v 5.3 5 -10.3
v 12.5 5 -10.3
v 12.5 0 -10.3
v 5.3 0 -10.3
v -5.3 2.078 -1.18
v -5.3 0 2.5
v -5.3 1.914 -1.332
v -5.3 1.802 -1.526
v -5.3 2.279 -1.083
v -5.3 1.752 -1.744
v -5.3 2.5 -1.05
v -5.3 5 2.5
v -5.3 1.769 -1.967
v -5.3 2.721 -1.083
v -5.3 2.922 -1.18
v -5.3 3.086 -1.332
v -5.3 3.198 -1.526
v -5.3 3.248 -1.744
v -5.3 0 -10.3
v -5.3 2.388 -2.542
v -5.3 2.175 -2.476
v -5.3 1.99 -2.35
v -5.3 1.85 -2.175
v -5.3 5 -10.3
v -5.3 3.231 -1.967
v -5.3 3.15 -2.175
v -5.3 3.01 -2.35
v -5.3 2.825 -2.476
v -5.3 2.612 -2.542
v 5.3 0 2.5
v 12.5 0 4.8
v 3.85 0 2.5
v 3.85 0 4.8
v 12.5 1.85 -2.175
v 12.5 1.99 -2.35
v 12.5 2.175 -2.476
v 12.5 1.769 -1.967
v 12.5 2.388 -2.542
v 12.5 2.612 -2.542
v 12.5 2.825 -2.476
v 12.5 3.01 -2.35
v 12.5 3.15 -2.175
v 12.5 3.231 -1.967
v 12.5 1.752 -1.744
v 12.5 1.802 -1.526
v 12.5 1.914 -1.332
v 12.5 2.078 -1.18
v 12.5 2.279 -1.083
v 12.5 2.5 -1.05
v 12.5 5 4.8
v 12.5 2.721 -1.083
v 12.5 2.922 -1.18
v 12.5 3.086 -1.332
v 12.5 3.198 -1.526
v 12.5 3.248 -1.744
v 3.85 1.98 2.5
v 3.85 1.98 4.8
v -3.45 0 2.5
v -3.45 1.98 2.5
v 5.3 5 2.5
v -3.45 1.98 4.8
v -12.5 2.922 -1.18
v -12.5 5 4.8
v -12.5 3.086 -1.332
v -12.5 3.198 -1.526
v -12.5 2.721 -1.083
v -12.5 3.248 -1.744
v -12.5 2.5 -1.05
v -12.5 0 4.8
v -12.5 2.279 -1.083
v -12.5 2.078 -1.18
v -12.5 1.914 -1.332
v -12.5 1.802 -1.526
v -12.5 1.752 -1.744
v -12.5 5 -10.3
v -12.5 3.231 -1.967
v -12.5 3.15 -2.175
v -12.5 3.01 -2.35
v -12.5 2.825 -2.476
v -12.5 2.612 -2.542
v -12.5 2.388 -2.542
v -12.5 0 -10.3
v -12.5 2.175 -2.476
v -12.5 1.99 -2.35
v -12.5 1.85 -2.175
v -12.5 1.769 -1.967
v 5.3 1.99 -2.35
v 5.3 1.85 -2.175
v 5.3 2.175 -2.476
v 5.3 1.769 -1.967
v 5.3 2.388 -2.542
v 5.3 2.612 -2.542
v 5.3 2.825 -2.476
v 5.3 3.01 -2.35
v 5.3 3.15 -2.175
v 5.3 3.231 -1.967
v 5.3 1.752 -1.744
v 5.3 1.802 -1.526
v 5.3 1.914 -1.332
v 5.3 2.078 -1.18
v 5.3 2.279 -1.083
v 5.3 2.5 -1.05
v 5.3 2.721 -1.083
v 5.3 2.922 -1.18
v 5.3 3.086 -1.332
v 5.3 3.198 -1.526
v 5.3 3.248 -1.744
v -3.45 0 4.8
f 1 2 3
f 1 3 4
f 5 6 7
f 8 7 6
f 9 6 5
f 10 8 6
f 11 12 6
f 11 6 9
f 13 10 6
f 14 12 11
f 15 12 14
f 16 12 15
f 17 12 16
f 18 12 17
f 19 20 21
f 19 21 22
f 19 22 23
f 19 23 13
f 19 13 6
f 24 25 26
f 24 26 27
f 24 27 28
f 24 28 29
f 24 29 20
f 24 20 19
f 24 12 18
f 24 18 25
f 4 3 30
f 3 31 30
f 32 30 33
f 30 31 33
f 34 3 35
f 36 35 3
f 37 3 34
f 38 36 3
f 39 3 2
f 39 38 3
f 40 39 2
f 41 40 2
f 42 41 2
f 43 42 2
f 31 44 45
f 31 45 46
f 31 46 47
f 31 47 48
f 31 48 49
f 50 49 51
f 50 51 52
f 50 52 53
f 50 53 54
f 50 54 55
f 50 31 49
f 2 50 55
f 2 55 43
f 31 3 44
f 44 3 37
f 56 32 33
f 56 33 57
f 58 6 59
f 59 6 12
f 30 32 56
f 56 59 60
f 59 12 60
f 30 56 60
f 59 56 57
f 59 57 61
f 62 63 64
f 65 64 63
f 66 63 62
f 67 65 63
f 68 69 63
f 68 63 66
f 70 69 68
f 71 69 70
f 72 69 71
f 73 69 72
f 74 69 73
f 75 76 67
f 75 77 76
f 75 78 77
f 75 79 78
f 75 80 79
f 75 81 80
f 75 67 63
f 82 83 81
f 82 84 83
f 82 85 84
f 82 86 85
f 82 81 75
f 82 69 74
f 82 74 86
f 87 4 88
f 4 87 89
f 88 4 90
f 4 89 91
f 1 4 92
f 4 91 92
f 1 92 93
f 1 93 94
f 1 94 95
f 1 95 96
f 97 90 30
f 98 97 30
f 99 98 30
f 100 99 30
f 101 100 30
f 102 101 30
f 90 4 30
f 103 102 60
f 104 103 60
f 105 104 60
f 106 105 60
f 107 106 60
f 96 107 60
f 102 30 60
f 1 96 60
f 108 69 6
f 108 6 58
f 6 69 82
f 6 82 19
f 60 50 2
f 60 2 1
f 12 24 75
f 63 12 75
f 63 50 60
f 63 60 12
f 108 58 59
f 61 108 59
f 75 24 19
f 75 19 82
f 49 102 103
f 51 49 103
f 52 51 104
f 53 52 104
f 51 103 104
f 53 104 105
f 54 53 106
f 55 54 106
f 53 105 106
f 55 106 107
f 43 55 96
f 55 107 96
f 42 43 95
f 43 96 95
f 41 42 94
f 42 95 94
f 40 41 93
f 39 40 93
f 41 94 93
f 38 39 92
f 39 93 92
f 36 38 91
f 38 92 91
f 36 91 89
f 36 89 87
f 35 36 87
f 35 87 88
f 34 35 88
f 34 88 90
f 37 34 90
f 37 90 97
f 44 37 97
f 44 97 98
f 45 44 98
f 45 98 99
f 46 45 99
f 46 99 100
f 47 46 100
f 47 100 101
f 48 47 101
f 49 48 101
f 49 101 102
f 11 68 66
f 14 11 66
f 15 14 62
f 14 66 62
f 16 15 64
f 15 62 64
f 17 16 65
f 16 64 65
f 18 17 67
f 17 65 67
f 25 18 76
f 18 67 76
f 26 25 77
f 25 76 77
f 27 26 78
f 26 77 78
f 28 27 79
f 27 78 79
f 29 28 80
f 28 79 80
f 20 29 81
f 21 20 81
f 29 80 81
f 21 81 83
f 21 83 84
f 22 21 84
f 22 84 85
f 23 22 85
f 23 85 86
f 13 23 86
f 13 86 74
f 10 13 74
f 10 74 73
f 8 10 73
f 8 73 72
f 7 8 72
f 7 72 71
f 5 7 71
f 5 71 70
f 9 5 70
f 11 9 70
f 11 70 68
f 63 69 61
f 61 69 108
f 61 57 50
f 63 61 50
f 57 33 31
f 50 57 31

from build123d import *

# Parameters (mm, degrees)
SKETCH1_W           = 25
SKETCH1_H           = 9.6
BOSS_EXTRUDE1_DEPTH = 5
SKETCH2_W           = 10.6
SKETCH2_H           = 7.3
CUT_EXTRUDE1_DEPTH  = 10
SKETCH3_W           = 7.3
SKETCH3_H           = 1.98
CUT_EXTRUDE2_DEPTH  = 10
SKETCH4_R           = 0.75
CUT_EXTRUDE3_DEPTH  = 26
SKETCH6_W           = 7.2
SKETCH6_H           = 5
BOSS_EXTRUDE3_DEPTH = 5.5


with BuildPart() as part:
    # Sketch1 → Boss-Extrude1 (new body)
    with BuildSketch(Plane(origin=(0, 0, 0), x_dir=(1, 0, 0), z_dir=(0, 1, 0))):
        Rectangle(SKETCH1_W, SKETCH1_H)
    extrude(amount=BOSS_EXTRUDE1_DEPTH)

    # Sketch2 → Cut-Extrude1 (cut)
    with BuildSketch(Plane(origin=(0, 5, 0), x_dir=(1, 0, 0), z_dir=(0, 1, 0))):
        with Locations((0, 1.15)):
            Rectangle(SKETCH2_W, SKETCH2_H)
    extrude(amount=-CUT_EXTRUDE1_DEPTH, mode=Mode.SUBTRACT)

    # Sketch3 → Cut-Extrude2 (cut)
    with BuildSketch(Plane(origin=(0, 0, 2.5), x_dir=(-1, 0, 0), z_dir=(0, 0, -1))):
        with Locations((-0.2, 0.99)):
            Rectangle(SKETCH3_W, SKETCH3_H)
    extrude(amount=-CUT_EXTRUDE2_DEPTH, mode=Mode.SUBTRACT)

    # Sketch4 → Cut-Extrude3 (cut)
    with BuildSketch(Plane.ZY.offset(12.5)):
        with Locations((-1.8, 2.5)):
            Circle(SKETCH4_R)
    extrude(amount=-CUT_EXTRUDE3_DEPTH, mode=Mode.SUBTRACT)

    # Sketch6 → Boss-Extrude3 (add)
    with BuildSketch(Plane(origin=(0, 0, -4.8), x_dir=(-1, 0, 0), z_dir=(0, 0, -1))):
        with Locations((-8.9, 2.5)):
            Rectangle(SKETCH6_W, SKETCH6_H)
        with Locations((8.9, 2.5)):
            Rectangle(SKETCH6_W, SKETCH6_H)
    extrude(amount=BOSS_EXTRUDE3_DEPTH)


solid = part.part
